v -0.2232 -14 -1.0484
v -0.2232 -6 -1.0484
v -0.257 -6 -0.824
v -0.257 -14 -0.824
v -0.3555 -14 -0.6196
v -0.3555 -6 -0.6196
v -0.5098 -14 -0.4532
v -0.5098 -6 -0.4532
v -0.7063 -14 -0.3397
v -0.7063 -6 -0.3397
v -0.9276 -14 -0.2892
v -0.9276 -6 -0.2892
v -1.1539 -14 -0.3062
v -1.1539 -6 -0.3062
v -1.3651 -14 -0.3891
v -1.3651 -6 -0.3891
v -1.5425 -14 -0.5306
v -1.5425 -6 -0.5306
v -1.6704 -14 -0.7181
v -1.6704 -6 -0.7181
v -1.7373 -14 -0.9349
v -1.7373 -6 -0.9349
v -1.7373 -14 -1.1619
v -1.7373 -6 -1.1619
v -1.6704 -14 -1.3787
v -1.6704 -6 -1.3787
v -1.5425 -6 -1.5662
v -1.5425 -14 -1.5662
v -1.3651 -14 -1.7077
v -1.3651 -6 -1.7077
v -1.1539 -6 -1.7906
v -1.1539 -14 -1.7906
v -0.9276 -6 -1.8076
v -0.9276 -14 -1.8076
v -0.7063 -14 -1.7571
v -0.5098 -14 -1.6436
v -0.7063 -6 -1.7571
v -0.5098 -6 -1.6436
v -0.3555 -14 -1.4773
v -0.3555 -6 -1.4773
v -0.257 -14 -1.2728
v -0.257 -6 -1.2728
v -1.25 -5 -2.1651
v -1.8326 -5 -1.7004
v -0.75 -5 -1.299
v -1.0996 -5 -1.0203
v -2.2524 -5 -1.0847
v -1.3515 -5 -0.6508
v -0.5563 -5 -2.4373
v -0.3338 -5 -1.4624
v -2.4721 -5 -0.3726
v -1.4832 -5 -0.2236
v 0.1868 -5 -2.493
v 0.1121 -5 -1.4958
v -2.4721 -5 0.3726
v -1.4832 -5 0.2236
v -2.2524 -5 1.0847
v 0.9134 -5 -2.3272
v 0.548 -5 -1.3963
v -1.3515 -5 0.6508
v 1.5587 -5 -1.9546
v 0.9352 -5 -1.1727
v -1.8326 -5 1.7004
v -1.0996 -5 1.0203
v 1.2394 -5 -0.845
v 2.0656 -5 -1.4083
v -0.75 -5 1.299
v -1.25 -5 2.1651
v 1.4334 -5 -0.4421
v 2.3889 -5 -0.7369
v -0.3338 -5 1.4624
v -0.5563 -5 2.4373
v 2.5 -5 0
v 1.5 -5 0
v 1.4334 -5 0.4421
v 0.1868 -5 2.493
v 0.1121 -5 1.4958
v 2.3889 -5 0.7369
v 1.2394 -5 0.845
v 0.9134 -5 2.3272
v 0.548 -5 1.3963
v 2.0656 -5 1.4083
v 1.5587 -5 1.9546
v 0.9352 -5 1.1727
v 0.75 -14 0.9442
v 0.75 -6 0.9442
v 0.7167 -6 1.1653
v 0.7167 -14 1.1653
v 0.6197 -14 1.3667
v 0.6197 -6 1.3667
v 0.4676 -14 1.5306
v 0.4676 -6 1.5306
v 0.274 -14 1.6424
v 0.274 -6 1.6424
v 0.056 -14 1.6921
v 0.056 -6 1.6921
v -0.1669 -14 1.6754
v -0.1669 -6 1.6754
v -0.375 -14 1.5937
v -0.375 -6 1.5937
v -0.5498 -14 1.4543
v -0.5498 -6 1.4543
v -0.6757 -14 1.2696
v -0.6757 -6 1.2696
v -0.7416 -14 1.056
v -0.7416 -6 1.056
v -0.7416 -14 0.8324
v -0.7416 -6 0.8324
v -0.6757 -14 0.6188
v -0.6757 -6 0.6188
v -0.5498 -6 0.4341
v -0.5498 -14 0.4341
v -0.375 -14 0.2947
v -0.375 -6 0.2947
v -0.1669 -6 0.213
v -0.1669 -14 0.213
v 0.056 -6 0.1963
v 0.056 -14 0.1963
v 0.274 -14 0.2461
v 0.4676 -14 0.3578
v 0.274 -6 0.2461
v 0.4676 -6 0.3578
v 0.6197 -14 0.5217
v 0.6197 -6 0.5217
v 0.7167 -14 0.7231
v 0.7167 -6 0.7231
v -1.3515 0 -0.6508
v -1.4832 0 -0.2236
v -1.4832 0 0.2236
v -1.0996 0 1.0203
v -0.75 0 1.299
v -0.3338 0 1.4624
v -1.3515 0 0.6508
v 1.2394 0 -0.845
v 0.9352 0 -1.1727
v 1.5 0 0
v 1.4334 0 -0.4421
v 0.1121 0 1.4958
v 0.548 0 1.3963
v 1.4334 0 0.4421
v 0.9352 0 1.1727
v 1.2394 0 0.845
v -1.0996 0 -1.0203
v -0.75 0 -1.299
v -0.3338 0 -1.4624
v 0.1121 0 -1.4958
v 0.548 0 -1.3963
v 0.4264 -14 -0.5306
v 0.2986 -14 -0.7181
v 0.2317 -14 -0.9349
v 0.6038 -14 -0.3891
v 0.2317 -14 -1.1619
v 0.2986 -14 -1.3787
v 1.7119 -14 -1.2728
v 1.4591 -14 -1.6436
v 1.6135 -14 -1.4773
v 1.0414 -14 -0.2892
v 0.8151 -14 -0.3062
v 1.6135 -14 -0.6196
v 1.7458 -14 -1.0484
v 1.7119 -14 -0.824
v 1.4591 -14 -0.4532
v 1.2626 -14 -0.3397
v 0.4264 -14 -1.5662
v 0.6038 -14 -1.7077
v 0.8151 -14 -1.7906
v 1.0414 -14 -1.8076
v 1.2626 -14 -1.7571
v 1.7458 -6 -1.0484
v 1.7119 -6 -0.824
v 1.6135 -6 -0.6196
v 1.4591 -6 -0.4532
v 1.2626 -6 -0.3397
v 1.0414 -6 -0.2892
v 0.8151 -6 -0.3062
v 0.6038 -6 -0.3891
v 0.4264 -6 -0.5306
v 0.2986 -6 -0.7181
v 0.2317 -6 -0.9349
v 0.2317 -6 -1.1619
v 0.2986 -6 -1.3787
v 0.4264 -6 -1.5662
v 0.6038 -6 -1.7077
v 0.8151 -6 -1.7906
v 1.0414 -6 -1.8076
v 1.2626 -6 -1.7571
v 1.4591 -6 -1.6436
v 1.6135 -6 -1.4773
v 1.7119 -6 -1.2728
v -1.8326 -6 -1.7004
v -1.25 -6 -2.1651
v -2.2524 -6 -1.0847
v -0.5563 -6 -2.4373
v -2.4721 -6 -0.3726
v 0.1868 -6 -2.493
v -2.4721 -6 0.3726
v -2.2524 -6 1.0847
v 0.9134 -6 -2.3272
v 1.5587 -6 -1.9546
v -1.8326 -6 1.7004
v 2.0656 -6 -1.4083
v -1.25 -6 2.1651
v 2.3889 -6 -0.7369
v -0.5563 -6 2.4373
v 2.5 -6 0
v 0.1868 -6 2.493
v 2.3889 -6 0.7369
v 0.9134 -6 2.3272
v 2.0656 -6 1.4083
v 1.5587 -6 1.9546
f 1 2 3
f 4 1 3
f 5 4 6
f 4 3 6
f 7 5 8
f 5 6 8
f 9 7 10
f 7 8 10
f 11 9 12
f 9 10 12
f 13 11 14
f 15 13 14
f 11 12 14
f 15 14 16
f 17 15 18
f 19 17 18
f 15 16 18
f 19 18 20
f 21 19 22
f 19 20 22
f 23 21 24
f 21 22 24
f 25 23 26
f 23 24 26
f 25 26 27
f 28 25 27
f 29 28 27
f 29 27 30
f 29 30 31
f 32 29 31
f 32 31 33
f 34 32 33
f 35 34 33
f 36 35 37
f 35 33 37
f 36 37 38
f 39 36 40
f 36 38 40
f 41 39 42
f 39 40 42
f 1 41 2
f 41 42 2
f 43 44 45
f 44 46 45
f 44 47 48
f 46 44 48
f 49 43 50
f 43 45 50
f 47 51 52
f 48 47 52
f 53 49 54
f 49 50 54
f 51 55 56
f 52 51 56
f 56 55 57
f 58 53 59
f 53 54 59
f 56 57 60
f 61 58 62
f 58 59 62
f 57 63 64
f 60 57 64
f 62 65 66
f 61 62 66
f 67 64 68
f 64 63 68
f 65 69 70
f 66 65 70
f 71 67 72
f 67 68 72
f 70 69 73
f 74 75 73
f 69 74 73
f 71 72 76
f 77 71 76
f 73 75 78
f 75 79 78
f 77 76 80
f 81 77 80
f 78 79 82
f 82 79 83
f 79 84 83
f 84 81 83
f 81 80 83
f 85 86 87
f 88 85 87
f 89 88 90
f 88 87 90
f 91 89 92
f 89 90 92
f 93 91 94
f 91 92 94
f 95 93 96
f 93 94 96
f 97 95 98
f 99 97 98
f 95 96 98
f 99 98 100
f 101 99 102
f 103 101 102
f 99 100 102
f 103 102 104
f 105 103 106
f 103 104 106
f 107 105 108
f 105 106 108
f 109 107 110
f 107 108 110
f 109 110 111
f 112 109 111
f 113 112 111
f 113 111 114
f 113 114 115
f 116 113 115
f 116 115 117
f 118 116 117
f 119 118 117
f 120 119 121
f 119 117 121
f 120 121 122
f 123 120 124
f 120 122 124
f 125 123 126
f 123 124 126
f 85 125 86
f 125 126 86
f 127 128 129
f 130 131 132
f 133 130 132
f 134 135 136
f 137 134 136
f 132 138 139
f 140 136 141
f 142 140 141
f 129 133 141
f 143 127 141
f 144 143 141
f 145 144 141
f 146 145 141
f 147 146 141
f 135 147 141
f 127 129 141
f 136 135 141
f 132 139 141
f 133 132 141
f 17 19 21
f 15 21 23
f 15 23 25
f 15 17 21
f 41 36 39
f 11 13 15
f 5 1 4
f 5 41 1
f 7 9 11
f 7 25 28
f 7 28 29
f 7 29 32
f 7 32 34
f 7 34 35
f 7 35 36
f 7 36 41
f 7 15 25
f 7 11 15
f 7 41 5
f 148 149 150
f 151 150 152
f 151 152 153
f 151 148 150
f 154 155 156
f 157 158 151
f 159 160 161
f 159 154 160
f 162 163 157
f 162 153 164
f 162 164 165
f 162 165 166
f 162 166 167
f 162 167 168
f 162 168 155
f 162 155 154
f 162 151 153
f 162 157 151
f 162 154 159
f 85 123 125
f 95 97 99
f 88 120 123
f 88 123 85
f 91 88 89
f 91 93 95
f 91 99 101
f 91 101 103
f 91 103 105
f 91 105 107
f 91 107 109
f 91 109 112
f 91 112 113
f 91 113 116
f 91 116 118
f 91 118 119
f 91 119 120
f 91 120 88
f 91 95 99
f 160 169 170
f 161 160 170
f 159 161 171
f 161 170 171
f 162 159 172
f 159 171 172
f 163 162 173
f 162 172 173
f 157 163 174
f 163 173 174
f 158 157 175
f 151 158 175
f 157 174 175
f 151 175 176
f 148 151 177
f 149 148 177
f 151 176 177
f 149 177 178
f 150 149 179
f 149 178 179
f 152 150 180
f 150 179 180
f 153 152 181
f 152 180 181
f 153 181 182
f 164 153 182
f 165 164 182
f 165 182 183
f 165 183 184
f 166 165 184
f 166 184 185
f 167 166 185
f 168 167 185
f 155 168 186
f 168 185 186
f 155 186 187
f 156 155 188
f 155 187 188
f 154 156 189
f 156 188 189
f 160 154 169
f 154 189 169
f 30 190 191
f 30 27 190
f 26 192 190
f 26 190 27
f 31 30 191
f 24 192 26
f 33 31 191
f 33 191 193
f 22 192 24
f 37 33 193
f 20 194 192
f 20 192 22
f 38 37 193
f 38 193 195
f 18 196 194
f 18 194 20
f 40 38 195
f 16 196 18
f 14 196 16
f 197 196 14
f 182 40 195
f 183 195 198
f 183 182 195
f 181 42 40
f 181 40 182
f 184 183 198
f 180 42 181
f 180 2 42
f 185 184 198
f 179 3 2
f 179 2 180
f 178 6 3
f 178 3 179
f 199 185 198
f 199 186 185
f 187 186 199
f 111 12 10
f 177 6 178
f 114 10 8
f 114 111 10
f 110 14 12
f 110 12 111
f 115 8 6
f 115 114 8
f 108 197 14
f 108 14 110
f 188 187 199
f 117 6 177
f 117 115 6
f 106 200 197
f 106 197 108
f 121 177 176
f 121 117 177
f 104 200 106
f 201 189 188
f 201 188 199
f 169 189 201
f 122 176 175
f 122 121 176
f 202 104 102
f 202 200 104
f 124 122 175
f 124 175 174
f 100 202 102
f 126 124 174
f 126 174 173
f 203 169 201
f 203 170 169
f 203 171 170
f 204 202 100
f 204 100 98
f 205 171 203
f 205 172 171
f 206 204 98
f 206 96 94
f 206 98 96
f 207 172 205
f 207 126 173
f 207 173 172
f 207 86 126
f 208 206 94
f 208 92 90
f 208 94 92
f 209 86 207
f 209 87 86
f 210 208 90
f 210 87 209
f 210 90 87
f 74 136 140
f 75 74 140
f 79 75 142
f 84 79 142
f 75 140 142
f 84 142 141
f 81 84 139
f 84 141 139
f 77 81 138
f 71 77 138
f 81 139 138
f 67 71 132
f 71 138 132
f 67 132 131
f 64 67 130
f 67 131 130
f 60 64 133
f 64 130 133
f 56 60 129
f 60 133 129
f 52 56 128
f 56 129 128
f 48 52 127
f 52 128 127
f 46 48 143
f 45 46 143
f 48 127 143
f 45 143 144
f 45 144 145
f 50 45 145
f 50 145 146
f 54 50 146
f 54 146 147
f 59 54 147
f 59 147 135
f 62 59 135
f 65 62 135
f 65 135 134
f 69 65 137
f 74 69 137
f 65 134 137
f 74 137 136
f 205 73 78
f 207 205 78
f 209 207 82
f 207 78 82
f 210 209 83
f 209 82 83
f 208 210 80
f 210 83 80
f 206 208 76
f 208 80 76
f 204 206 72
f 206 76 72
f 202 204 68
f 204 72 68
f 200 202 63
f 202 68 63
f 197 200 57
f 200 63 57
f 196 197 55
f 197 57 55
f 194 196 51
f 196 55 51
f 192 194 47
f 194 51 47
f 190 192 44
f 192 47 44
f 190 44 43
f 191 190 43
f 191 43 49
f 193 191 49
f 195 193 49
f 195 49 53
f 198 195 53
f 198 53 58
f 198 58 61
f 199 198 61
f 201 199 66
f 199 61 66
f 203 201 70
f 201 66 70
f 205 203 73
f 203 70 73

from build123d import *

# Parameters (mm, degrees)
F0_R     = 1.5
F1_DEPTH = 5
F2_R     = 2.5
F3_DEPTH = 1
F4_R     = 0.761295
F4_R_2   = 0.75
F5_DEPTH = 8


with BuildPart() as f1:
    # F0 (on Front) → F1 (new body)
    with BuildSketch(Plane.XZ):
        Circle(F0_R)
    extrude(amount=F1_DEPTH)

    # F2 (on face) → F3 (join)
    with BuildSketch(Plane.XZ.offset(5)):
        Circle(F2_R)
    extrude(amount=F3_DEPTH)

    # F4 (on face) → F5 (join)
    with BuildSketch(Plane.XZ.offset(6)):
        with Locations((0.984464, -1.048415)):
            Circle(F4_R)
        with Locations((-0.984464, -1.048415)):
            Circle(F4_R)
        with Locations((0, 0.944208)):
            Circle(F4_R_2)
    extrude(amount=F5_DEPTH)


solid = f1.part
